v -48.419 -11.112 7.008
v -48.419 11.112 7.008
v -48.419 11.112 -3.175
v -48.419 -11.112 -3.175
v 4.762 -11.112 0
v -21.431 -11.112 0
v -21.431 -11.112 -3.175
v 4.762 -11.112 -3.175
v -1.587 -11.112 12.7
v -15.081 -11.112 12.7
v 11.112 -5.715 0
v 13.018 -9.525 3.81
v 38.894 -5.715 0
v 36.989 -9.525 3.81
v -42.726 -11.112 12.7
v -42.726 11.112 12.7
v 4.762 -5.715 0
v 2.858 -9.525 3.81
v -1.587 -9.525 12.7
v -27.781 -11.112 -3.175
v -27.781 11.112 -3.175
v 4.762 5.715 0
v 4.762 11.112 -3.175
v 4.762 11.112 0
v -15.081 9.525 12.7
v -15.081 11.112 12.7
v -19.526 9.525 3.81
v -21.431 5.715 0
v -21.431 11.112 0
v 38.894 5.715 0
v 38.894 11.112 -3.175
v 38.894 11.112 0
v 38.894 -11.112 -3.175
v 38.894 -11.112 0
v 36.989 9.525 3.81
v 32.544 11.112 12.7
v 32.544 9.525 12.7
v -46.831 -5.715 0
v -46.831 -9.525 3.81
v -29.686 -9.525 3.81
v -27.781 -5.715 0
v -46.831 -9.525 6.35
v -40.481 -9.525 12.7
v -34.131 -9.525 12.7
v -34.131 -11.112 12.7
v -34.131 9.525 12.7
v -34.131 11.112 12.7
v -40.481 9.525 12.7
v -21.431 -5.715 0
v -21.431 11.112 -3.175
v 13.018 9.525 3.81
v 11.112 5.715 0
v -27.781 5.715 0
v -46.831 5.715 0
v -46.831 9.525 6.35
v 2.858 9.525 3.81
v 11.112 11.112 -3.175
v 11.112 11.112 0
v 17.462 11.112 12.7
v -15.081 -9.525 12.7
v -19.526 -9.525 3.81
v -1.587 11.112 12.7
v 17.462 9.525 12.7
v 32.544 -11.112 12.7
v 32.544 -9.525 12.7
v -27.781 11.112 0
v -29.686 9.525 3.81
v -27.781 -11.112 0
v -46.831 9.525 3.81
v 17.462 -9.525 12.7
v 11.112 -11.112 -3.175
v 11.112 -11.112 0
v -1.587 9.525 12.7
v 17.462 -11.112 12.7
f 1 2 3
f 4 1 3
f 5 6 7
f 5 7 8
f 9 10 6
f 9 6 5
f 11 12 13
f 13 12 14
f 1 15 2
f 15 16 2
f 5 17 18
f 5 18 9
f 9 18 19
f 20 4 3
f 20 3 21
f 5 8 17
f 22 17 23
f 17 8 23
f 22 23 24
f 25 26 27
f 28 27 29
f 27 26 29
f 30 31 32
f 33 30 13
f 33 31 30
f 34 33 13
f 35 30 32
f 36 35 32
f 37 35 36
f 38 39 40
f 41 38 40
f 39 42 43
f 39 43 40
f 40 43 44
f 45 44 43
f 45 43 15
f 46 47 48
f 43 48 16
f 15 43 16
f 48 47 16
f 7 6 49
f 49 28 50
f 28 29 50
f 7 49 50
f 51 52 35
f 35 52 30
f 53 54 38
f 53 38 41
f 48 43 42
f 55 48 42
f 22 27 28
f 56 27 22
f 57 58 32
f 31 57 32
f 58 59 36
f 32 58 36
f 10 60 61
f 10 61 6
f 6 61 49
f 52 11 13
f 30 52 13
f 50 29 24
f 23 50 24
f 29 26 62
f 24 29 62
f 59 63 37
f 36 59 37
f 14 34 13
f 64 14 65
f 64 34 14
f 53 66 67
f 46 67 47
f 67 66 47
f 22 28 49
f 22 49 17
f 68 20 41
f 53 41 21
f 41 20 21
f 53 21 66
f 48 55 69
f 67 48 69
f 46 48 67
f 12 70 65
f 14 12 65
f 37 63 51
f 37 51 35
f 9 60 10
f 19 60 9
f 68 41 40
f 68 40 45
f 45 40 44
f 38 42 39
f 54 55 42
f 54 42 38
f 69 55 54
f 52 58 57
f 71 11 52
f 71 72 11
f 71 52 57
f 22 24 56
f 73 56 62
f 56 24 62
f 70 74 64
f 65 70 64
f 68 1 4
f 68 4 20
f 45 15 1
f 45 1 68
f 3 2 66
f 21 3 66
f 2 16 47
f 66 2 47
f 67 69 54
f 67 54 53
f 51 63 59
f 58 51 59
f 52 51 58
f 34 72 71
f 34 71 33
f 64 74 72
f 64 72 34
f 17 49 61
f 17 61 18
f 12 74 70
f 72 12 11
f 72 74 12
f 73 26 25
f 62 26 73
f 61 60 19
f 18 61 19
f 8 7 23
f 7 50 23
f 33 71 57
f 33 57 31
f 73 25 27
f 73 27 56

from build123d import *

# Parameters (mm, degrees)
F0_W     = 13.49375
F0_H     = 12.7
F0_W_2   = 15.08125
F0_W_3   = 6.35
F1_DEPTH = 11.1125
F2_DEPTH = 9.525
F3_SIZE  = 3.81


with BuildPart() as f1:
    # F0 (on Front) → F1 (new body, symmetric)
    with BuildSketch(Plane.XZ):
        Polygon((-46.83125, 0), (-40.48125, 0), (-40.48125, 12.7), (-46.83125, 6.35), align=None)
        Polygon((-21.43125, 0), (-15.08125, 0), (-15.08125, 12.7), align=None)
        Polygon((-1.5875, 0), (4.7625, 0), (-1.5875, 12.7), align=None)
        Polygon((-34.13125, 0), (-27.78125, 0), (-34.13125, 12.7), align=None)
        Polygon((17.4625, 12.7), (11.1125, 0), (17.4625, 0), align=None)
        Polygon((32.54375, 0), (38.89375, 0), (32.54375, 12.7), align=None)
        Polygon((4.7625, -3.175), (4.7625, 0), (-1.5875, 0), (-15.08125, 0), (-21.43125, 0), (-21.43125, -3.175), align=None)
        with Locations((-8.334375, 6.35)):
            Rectangle(F0_W, F0_H)
        Polygon((11.1125, 0), (11.1125, -3.175), (38.89375, -3.175), (38.89375, 0), (32.54375, 0), (17.4625, 0), align=None)
        with Locations((25.003125, 6.35)):
            Rectangle(F0_W_2, F0_H)
        Polygon((-48.41875, -3.175), (-46.83125, -3.175), (-46.83125, 0), (-46.83125, 6.35), (-40.48125, 12.7), (-42.726314, 12.7), (-48.41875, 7.007564), (-48.41875, 6.35), align=None)
        with Locations((-37.30625, 6.35)):
            Rectangle(F0_W_3, F0_H)
        Polygon((-27.78125, -3.175), (-27.78125, 0), (-34.13125, 0), (-40.48125, 0), (-46.83125, 0), (-46.83125, -3.175), align=None)
    extrude(amount=F1_DEPTH, both=True)

    # F0 (on Front) → F2 (cut, symmetric)
    with BuildSketch(Plane.XZ):
        Polygon((-46.83125, 0), (-40.48125, 0), (-40.48125, 12.7), (-46.83125, 6.35), align=None)
        with Locations((-37.30625, 6.35)):
            Rectangle(F0_W_3, F0_H)
        Polygon((-34.13125, 0), (-27.78125, 0), (-34.13125, 12.7), align=None)
        with Locations((-8.334375, 6.35)):
            Rectangle(F0_W, F0_H)
        Polygon((-21.43125, 0), (-15.08125, 0), (-15.08125, 12.7), align=None)
        Polygon((-1.5875, 0), (4.7625, 0), (-1.5875, 12.7), align=None)
        Polygon((17.4625, 12.7), (11.1125, 0), (17.4625, 0), align=None)
        with Locations((25.003125, 6.35)):
            Rectangle(F0_W_2, F0_H)
        Polygon((32.54375, 0), (38.89375, 0), (32.54375, 12.7), align=None)
    extrude(amount=F2_DEPTH, both=True, mode=Mode.SUBTRACT)

    # F3
    f3_edges = [f1.edges().sort_by_distance(p)[0] for p in [
        (-37.30625, 9.525, 0),
        (-37.30625, -9.525, 0),
        (-8.334375, -9.525, 0),
        (25.003125, -9.525, 0),
        (-8.334375, 9.525, 0),
        (25.003125, 9.525, 0),
    ]]
    chamfer(f3_edges, length=F3_SIZE)


solid = f1.part
